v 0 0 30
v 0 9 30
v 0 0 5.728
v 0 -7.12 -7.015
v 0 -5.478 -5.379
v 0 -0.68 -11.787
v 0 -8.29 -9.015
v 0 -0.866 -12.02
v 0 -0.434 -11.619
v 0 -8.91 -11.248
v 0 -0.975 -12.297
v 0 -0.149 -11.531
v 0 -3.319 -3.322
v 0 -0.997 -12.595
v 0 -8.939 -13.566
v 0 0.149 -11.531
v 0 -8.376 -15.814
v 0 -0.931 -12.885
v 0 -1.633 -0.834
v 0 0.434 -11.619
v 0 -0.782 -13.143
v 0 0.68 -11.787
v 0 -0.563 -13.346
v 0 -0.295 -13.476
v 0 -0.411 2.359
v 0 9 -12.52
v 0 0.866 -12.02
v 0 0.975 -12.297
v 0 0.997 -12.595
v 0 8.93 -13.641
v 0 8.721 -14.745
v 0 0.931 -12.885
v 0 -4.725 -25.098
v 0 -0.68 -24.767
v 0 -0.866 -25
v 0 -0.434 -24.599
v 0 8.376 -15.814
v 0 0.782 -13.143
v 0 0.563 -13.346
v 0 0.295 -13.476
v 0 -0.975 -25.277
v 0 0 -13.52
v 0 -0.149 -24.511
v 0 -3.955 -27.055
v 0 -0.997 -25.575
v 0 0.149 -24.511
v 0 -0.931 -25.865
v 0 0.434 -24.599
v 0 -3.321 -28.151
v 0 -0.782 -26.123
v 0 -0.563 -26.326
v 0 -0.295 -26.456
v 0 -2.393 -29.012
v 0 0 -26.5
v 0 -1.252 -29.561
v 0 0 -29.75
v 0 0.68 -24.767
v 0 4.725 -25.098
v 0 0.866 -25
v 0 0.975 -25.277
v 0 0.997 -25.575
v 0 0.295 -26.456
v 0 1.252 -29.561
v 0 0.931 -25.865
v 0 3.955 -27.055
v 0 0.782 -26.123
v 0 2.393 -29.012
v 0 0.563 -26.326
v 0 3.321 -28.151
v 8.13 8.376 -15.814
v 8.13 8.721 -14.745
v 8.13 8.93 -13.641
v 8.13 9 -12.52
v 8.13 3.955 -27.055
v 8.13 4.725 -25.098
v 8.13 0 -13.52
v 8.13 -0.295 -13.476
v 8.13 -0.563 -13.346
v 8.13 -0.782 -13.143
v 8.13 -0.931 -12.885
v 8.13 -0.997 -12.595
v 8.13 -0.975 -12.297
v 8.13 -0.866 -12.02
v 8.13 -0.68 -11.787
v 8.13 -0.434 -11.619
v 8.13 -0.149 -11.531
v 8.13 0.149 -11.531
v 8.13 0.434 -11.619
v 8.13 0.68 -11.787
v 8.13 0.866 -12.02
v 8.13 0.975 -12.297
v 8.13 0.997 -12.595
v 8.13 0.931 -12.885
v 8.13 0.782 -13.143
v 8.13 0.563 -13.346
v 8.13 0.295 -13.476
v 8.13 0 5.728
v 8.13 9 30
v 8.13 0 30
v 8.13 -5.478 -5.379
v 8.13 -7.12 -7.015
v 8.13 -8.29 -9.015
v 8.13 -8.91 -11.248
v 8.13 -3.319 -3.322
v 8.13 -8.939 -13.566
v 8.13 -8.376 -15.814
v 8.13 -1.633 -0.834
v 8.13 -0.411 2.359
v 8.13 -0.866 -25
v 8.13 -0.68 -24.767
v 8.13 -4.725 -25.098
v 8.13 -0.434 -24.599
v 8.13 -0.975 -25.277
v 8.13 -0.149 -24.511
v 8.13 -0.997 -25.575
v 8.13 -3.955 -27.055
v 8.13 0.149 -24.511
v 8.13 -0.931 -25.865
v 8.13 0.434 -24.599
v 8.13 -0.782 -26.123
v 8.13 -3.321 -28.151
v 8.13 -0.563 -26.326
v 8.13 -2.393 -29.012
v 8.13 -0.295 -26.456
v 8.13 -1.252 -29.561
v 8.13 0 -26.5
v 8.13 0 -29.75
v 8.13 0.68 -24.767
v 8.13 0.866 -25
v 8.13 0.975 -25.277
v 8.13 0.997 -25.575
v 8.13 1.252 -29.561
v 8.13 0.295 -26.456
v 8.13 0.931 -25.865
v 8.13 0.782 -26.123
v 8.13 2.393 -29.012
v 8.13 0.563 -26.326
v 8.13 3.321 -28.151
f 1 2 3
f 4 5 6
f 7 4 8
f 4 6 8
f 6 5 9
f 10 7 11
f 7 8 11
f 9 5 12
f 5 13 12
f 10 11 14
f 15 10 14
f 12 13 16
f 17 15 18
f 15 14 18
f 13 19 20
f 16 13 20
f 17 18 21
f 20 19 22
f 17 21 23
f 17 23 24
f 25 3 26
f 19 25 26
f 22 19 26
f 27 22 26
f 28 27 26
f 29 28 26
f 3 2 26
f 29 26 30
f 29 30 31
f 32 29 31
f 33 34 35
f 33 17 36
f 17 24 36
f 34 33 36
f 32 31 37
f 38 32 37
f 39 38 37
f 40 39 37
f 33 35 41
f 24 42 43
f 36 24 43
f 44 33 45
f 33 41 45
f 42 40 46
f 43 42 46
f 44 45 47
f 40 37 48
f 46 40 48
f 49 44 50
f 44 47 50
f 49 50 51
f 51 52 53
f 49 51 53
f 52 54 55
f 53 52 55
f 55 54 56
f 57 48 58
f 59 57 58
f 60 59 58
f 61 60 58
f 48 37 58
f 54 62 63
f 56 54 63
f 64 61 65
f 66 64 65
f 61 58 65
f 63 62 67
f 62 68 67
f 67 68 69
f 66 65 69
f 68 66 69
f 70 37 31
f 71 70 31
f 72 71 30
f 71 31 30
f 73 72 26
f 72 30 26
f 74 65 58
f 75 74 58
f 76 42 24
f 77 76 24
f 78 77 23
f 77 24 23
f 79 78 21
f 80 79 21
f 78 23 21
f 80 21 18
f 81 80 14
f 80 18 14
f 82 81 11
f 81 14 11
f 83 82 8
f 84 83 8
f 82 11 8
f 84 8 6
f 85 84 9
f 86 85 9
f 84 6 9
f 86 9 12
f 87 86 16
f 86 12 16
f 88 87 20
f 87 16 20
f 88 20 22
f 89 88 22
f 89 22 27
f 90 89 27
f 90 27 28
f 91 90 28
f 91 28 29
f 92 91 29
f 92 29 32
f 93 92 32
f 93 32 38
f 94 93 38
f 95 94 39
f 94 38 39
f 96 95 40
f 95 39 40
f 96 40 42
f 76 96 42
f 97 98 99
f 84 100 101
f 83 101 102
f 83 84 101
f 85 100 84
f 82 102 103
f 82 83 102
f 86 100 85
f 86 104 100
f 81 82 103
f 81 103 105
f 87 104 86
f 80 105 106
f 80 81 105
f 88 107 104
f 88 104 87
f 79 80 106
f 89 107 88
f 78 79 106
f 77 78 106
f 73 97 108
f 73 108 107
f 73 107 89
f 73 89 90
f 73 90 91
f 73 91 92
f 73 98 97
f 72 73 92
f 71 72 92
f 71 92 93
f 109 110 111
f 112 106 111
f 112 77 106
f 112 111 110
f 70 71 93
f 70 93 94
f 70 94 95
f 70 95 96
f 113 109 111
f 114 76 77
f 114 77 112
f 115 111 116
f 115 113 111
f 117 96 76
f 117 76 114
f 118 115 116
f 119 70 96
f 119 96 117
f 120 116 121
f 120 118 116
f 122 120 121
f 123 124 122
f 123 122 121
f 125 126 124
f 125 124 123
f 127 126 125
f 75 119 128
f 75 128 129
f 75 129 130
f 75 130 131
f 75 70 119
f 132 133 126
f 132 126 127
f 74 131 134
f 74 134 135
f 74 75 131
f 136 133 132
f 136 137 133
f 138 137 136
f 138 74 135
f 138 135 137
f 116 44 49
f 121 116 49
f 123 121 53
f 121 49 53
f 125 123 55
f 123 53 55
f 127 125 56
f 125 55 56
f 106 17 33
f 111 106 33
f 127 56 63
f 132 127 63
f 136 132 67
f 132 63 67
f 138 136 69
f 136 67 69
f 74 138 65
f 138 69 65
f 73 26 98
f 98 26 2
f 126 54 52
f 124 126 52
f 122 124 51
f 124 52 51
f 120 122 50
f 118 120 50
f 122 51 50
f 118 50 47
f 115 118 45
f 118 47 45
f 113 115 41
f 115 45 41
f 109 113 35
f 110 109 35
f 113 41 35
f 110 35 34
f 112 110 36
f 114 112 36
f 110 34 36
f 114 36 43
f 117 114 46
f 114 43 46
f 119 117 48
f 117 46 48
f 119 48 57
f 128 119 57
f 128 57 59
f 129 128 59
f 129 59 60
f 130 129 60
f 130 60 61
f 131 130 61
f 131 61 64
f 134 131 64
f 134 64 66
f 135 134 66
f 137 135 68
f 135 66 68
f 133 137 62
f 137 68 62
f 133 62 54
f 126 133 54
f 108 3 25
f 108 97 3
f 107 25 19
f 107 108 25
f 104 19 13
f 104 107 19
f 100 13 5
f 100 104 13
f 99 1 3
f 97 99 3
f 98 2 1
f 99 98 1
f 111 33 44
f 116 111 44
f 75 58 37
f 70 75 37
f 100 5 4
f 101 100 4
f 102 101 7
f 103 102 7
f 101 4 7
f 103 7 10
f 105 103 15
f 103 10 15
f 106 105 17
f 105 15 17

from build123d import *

# Parameters (mm, degrees)
EXTRUDE_1_DEPTH = 8.13
FILLET_1_R      = 14


with BuildPart() as part:
    # 草图1 → 凸台-拉伸1 (new body)
    with BuildSketch(Plane(origin=(0, 0, 0), x_dir=(0, 0, -1), z_dir=(1, 0, 0))):
        with BuildLine():
            Line((-30, 4.725), (4.860079961, 4.725))
            ThreePointArc((4.860079961, 4.725), (8.133942545, 7.858912138), (12.52, 9))
            Line((12.52, 9), (-30, 9))
            Line((-30, 9), (-30, 4.725))
        make_face()
        with BuildLine():
            ThreePointArc((12.52, 9), (8.133942545, 7.858912138), (4.860079961, 4.725))
            Line((4.860079961, 4.725), (20.179920039, 4.725))
            ThreePointArc((20.179920039, 4.725), (18.292906217, 6.904603813), (15.813528505, 8.375719073))
            ThreePointArc((15.813528505, 8.375719073), (14.196085968, 8.842552563), (12.52, 9))
        make_face()
        with BuildLine():
            ThreePointArc((11.52, 0), (12.52, 1), (13.52, 0))
            Line((13.52, 0), (21.25, 0))
            ThreePointArc((21.25, 0), (21.296353514, 0.625984202), (21.434402928, 1.238313549))
            ThreePointArc((21.434402928, 1.238313549), (20.988547163, 3.046917943), (20.179920039, 4.725))
            Line((20.179920039, 4.725), (4.860079961, 4.725))
            ThreePointArc((4.860079961, 4.725), (3.861498965, 2.455679097), (3.52, 0))
            Line((3.52, 0), (11.52, 0))
        make_face()
        with BuildLine():
            ThreePointArc((21.434402928, 1.238313549), (21.498575231, 0.620634213), (21.52, 0))
            Line((21.52, 0), (24.5, 0))
            ThreePointArc((24.5, 0), (25.5, 1), (26.5, 0))
            Line((26.5, 0), (29.75, 0))
            ThreePointArc((29.75, 0), (29.012294744, 2.392965865), (27.05527735, 3.955200673))
            ThreePointArc((27.05527735, 3.955200673), (23.650460817, 3.826448067), (21.434402928, 1.238313549))
        make_face()
        with BuildLine():
            Line((24.5, 0), (21.52, 0))
            ThreePointArc((21.52, 0), (21.498575231, -0.620634213), (21.434402928, -1.238313549))
            ThreePointArc((21.434402928, -1.238313549), (23.650460817, -3.826448067), (27.05527735, -3.955200673))
            ThreePointArc((27.05527735, -3.955200673), (29.012294744, -2.392965865), (29.75, 0))
            Line((29.75, 0), (26.5, 0))
            ThreePointArc((26.5, 0), (25.5, -1), (24.5, 0))
        make_face()
        with BuildLine():
            ThreePointArc((20.179920039, 4.725), (20.988547163, 3.046917943), (21.434402928, 1.238313549))
            ThreePointArc((21.434402928, 1.238313549), (23.650460817, 3.826448067), (27.05527735, 3.955200673))
            Line((27.05527735, 3.955200673), (25.097613132, 4.725))
            Line((25.097613132, 4.725), (20.179920039, 4.725))
        make_face()
        with BuildLine():
            ThreePointArc((15.813528505, 8.375719073), (18.292906217, 6.904603813), (20.179920039, 4.725))
            Line((20.179920039, 4.725), (25.097613132, 4.725))
            Line((25.097613132, 4.725), (15.813528505, 8.375719073))
        make_face()
        with BuildLine():
            Line((-30, 0), (3.52, 0))
            ThreePointArc((3.52, 0), (3.861498965, 2.455679097), (4.860079961, 4.725))
            Line((4.860079961, 4.725), (-30, 4.725))
            Line((-30, 4.725), (-30, 0))
        make_face()
        with BuildLine():
            Line((21.25, 0), (13.52, 0))
            ThreePointArc((13.52, 0), (12.52, -1), (11.52, 0))
            Line((11.52, 0), (3.52, 0))
            ThreePointArc((3.52, 0), (3.861498965, -2.455679097), (4.860079961, -4.725))
            Line((4.860079961, -4.725), (20.179920039, -4.725))
            ThreePointArc((20.179920039, -4.725), (20.988547163, -3.046917943), (21.434402928, -1.238313549))
            ThreePointArc((21.434402928, -1.238313549), (21.296353514, -0.625984202), (21.25, 0))
        make_face()
        with BuildLine():
            Line((20.179920039, -4.725), (4.860079961, -4.725))
            ThreePointArc((4.860079961, -4.725), (9.674252086, -8.538250336), (15.813528505, -8.375719073))
            ThreePointArc((15.813528505, -8.375719073), (18.292906217, -6.904603813), (20.179920039, -4.725))
        make_face()
        with BuildLine():
            ThreePointArc((27.05527735, -3.955200673), (23.650460817, -3.826448067), (21.434402928, -1.238313549))
            ThreePointArc((21.434402928, -1.238313549), (20.988547163, -3.046917943), (20.179920039, -4.725))
            Line((20.179920039, -4.725), (25.097613132, -4.725))
            Line((25.097613132, -4.725), (27.05527735, -3.955200673))
        make_face()
        with BuildLine():
            ThreePointArc((21.434402928, 1.238313549), (21.296353514, 0.625984202), (21.25, 0))
            Line((21.25, 0), (21.52, 0))
            ThreePointArc((21.52, 0), (21.498575231, 0.620634213), (21.434402928, 1.238313549))
        make_face()
        with BuildLine():
            Line((21.52, 0), (21.25, 0))
            ThreePointArc((21.25, 0), (21.296353514, -0.625984202), (21.434402928, -1.238313549))
            ThreePointArc((21.434402928, -1.238313549), (21.498575231, -0.620634213), (21.52, 0))
        make_face()
        with BuildLine():
            Line((25.097613132, -4.725), (20.179920039, -4.725))
            ThreePointArc((20.179920039, -4.725), (18.292906217, -6.904603813), (15.813528505, -8.375719073))
            Line((15.813528505, -8.375719073), (25.097613132, -4.725))
        make_face()
    extrude(amount=EXTRUDE_1_DEPTH)

    # 圆角1
    fillet_1_edges = [part.edges().sort_by_distance(p)[0] for p in [
        (4.065, 0, -3.52),
    ]]
    fillet(fillet_1_edges, radius=FILLET_1_R)


solid = part.part
